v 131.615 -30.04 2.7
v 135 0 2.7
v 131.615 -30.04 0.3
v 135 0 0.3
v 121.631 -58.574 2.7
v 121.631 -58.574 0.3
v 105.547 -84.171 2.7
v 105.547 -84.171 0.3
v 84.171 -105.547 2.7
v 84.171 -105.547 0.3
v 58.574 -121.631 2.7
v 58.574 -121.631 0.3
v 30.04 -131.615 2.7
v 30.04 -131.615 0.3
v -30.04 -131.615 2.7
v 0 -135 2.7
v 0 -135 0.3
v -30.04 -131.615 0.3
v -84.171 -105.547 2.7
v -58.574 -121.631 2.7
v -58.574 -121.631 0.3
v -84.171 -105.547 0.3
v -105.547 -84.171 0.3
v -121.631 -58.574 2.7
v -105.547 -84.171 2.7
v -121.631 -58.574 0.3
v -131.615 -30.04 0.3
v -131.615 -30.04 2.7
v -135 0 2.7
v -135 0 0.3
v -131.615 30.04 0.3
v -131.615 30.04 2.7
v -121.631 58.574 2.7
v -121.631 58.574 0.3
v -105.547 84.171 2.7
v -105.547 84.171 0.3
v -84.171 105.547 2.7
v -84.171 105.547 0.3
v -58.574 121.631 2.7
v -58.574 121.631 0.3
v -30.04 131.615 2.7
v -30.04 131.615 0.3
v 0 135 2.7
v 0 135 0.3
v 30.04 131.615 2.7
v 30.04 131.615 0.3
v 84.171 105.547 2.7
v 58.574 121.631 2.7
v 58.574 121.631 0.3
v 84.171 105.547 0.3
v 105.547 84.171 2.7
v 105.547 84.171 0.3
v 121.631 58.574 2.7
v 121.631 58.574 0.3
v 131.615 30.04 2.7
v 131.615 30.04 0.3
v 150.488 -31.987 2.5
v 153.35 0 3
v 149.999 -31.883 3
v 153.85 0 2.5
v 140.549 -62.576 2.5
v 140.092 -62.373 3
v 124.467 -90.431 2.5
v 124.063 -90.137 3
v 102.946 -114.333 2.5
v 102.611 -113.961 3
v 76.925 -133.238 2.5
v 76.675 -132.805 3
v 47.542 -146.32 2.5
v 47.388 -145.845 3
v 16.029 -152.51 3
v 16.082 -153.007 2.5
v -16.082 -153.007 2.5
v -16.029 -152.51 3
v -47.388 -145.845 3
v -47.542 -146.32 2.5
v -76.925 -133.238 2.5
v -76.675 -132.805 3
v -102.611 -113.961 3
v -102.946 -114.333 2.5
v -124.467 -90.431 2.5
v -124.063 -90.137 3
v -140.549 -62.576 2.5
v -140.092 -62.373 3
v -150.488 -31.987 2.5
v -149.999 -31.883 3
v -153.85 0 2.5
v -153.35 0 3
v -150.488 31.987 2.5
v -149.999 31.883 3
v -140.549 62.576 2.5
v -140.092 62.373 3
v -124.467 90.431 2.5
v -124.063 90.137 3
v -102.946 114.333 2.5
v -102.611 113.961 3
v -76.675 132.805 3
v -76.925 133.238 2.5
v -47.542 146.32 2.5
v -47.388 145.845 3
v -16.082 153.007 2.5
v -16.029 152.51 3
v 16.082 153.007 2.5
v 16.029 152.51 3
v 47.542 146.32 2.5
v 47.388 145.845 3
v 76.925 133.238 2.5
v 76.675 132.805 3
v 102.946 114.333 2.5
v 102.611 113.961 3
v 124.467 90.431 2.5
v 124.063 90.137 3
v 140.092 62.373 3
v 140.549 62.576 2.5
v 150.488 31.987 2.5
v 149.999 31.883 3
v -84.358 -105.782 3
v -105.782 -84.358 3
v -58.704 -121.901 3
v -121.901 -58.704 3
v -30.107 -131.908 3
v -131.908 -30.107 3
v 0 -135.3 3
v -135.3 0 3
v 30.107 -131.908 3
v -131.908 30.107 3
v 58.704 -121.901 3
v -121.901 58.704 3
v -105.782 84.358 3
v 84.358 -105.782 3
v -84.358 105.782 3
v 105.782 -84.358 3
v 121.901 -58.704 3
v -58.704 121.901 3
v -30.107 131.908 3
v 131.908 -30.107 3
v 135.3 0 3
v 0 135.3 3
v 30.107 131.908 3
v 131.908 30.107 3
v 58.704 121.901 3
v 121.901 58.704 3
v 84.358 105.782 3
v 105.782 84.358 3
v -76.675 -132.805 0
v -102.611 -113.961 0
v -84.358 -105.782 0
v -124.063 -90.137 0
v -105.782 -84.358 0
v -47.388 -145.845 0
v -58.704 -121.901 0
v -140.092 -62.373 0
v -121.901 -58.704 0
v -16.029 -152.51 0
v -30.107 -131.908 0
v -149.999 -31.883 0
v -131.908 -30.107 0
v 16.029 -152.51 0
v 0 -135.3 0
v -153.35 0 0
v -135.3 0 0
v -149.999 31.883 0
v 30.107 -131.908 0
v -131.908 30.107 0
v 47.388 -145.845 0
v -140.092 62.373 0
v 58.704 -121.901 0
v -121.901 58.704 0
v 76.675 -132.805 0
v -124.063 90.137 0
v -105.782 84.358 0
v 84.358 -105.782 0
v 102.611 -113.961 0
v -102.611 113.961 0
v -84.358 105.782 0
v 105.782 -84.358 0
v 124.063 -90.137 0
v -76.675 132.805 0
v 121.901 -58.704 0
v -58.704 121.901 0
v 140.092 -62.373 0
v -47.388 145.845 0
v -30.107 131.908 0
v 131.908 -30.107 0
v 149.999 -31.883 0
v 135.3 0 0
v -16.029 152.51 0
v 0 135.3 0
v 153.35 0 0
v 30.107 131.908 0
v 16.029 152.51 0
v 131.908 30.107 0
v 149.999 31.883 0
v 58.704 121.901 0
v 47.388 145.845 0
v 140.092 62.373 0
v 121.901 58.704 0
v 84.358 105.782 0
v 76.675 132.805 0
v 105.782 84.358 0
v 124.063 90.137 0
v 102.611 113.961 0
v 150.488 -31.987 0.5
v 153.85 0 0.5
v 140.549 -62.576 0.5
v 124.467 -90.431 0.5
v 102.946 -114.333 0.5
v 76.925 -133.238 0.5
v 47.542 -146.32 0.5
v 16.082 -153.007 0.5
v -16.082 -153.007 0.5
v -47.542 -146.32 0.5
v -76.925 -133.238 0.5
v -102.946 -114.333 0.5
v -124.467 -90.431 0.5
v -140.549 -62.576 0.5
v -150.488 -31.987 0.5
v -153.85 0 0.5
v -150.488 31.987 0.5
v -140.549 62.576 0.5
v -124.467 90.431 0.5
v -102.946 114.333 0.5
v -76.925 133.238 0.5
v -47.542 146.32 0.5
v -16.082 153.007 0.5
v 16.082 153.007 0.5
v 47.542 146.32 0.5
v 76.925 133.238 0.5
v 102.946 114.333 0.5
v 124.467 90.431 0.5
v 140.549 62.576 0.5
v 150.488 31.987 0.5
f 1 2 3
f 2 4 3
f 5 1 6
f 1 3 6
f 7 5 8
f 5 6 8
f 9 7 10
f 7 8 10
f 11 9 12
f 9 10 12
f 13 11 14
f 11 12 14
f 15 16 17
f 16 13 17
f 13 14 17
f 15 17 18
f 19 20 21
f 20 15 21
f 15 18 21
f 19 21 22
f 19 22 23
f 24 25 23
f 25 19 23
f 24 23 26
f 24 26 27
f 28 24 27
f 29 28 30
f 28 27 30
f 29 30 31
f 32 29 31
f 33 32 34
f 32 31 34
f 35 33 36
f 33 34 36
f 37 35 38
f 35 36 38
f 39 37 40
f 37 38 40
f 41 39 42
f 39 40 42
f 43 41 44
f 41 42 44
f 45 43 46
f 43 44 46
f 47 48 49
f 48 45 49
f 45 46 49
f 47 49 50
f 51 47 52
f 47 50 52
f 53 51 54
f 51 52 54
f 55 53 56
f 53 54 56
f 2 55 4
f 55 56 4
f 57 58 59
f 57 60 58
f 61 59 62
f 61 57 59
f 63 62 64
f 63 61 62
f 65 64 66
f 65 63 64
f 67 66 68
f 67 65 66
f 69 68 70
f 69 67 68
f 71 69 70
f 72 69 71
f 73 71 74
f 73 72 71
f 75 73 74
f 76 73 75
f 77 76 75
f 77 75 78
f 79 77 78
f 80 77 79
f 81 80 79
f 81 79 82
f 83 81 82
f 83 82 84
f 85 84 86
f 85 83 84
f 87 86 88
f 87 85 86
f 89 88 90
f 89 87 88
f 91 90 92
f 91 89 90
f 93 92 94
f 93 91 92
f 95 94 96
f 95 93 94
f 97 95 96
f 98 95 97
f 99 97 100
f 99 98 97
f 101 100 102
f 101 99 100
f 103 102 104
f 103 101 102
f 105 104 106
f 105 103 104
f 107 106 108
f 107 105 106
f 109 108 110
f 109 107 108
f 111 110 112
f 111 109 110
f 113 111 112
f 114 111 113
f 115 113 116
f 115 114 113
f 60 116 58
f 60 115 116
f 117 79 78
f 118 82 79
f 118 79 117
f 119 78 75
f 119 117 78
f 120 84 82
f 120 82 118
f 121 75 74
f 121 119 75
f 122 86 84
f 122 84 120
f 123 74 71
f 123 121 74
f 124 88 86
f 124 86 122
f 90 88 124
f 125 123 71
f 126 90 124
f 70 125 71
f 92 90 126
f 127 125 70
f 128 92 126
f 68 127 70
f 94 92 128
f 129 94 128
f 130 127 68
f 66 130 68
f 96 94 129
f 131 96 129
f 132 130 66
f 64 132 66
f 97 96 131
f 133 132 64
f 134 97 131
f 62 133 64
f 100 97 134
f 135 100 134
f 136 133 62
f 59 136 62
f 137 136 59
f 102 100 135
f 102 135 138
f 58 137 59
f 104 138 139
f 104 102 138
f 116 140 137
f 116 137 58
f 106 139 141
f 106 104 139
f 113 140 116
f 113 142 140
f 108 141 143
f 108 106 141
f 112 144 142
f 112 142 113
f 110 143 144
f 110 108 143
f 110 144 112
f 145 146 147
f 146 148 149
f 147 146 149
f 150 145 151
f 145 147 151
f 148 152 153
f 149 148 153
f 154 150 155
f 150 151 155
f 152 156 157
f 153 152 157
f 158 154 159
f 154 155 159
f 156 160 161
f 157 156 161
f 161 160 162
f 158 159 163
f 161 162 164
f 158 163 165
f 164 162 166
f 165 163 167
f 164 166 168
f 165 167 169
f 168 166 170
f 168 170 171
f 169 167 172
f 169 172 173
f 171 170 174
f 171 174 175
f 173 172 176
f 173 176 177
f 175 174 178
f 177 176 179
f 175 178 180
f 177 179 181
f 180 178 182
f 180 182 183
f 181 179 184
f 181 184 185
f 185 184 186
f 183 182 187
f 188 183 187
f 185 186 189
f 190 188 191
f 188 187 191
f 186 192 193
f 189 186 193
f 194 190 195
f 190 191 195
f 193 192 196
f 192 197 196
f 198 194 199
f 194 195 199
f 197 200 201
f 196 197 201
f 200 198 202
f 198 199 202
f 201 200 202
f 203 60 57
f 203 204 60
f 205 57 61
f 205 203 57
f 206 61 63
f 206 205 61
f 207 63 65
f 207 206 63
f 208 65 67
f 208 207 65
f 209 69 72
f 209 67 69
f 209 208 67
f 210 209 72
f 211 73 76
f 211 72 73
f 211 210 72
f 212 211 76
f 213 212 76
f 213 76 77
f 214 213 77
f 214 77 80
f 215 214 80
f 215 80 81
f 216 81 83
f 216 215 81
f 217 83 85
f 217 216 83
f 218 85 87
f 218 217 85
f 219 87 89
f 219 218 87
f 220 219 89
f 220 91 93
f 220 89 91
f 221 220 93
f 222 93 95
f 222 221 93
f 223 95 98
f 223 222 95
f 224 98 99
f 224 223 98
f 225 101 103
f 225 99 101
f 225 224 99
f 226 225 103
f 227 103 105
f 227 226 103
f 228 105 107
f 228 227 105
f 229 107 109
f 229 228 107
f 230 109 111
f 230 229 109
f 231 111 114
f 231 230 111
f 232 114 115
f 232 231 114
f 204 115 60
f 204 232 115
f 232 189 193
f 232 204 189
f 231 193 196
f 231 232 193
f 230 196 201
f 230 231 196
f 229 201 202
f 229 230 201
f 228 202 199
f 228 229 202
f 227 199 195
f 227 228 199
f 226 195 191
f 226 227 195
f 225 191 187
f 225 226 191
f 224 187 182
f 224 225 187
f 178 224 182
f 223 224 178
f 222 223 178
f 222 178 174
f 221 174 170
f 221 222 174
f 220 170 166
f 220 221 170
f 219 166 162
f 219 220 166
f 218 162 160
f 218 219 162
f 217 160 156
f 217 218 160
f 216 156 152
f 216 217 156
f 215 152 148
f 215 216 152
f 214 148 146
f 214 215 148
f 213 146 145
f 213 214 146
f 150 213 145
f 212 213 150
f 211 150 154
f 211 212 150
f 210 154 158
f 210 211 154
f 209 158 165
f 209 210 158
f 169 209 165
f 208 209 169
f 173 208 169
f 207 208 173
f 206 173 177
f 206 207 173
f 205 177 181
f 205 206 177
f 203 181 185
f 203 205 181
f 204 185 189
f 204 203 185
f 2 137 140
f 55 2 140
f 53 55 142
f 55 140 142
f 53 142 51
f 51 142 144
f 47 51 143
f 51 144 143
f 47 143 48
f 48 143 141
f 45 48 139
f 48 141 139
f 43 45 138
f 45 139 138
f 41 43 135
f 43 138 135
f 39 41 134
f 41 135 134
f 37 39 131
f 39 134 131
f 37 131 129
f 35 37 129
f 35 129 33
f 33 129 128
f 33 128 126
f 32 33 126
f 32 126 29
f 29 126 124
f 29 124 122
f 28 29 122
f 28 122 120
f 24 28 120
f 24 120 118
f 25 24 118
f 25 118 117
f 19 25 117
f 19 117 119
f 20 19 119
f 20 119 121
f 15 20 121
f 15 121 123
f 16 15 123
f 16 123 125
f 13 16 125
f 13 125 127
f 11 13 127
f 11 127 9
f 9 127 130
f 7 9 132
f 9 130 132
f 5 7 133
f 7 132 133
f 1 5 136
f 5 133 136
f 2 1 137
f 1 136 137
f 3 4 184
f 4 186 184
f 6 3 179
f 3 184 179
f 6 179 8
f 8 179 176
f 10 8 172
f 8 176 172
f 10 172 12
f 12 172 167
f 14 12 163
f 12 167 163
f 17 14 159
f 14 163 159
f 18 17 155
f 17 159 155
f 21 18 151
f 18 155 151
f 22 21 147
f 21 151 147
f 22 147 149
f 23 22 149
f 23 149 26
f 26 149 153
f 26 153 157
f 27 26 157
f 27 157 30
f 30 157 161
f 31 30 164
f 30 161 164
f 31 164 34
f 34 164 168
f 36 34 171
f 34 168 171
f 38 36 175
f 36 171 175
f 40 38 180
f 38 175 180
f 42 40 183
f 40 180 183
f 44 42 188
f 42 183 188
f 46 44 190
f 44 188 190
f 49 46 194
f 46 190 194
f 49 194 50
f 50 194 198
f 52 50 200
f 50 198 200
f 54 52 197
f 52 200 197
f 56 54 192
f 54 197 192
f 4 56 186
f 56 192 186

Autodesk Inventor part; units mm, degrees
ref_plane "YZ Plane" through (0, 0, 0) normal (1, 0, 0) x (0, 1, 0)
ref_plane "XZ Plane" through (0, 0, 0) normal (0, 1, 0) x (-1, 0, 0)
ref_plane "XY Plane" through (0, 0, 0) normal (0, 0, 1) x (1, 0, 0)
sketch "草圖1" plane through (0, 0, 0) normal (0, 0, 1) x (1, 0, 0)
  circle A0 centre (0, 0) radius 135
  circle A1 centre (0, 0) radius 153.85
  dimension "d0" = 270
  dimension "d1" = 18.85
  dimension "d2" = 307.7
extrude "擠出1" add sketch "草圖1" along normal blind 3
chamfer "倒角1" distance 0.3 angle 45 2 edges at (-135, 0, 3) (-135, 0, 0)
chamfer "倒角2" distance 0.5 angle 45 2 edges at (-153.85, 0, 3) (-153.85, 0, 0)
properties part number "鐵弗龍間隔環"
